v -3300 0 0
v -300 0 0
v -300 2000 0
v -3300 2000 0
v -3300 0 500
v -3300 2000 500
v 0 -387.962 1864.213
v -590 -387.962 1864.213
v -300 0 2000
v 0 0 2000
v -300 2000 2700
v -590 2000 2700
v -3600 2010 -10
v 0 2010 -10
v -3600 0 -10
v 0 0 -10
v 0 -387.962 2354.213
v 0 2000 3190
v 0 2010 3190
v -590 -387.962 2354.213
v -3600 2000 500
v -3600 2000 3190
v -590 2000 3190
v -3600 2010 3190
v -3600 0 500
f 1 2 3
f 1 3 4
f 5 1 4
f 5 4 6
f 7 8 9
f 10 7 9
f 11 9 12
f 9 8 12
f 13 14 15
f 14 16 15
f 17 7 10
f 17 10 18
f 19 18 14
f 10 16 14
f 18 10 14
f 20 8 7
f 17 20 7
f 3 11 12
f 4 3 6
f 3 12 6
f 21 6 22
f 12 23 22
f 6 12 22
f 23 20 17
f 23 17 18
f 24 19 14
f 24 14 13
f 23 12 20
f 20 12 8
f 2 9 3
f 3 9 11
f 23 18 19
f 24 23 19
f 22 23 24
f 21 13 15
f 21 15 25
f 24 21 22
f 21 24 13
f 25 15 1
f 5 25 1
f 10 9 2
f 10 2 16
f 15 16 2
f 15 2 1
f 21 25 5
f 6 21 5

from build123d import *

# Parameters (mm, degrees)
F0_W     = 300
F0_H     = 500
F0_H_2   = 2000
F1_DEPTH = 2000
F2_W     = 3600
F2_H     = 3200
F3_DEPTH = 10
F5_DEPTH = 300
F6_W     = 590
F6_H     = 2530


with BuildPart() as f1:
    # F0 (on Front) → F1 (new body)
    with BuildSketch(Plane.XZ):
        with Locations((-3450, 250)):
            Rectangle(F0_W, F0_H)
        Polygon((-3300, 0), (-3600, 0), (-3600, -10), (0, -10), (0, 0), (-300, 0), align=None)
        with Locations((-150, 1000)):
            Rectangle(F0_W, F0_H_2)
    extrude(amount=-F1_DEPTH)

    # F2 (on face) → F3 (join)
    with BuildSketch(Plane(origin=(0, 2000, 0), x_dir=(-1, 0, 0), z_dir=(0, 1, 0))):
        with Locations((1800, 1590)):
            Rectangle(F2_W, F2_H)
    extrude(amount=F3_DEPTH)

    # F4 (on face) → F5 (join)
    with BuildSketch(Plane.YZ):
        Polygon((2000, 2700), (0, 2000), (2000, 2000), align=None)
    extrude(amount=-F5_DEPTH)

    # F7: sweep along a path in F7_path
    with BuildLine(Plane(origin=(0, 2000, 3190), x_dir=(0, 0, 1), z_dir=(0, -1, 0))) as f7_path:
        Line((0, 0), (-490, 0))
    # F6 (on face) → F7 (sweep)
    with BuildSketch(Plane(origin=(0, -623.6080178174, 1781.7371937639), x_dir=(1, 0, 0), z_dir=(0, -0.3303504247, 0.9438583564))):
        with Locations((-295, 1514.6628594979)):
            Rectangle(F6_W, F6_H)
    sweep(path=f7_path.line)


solid = f1.part
